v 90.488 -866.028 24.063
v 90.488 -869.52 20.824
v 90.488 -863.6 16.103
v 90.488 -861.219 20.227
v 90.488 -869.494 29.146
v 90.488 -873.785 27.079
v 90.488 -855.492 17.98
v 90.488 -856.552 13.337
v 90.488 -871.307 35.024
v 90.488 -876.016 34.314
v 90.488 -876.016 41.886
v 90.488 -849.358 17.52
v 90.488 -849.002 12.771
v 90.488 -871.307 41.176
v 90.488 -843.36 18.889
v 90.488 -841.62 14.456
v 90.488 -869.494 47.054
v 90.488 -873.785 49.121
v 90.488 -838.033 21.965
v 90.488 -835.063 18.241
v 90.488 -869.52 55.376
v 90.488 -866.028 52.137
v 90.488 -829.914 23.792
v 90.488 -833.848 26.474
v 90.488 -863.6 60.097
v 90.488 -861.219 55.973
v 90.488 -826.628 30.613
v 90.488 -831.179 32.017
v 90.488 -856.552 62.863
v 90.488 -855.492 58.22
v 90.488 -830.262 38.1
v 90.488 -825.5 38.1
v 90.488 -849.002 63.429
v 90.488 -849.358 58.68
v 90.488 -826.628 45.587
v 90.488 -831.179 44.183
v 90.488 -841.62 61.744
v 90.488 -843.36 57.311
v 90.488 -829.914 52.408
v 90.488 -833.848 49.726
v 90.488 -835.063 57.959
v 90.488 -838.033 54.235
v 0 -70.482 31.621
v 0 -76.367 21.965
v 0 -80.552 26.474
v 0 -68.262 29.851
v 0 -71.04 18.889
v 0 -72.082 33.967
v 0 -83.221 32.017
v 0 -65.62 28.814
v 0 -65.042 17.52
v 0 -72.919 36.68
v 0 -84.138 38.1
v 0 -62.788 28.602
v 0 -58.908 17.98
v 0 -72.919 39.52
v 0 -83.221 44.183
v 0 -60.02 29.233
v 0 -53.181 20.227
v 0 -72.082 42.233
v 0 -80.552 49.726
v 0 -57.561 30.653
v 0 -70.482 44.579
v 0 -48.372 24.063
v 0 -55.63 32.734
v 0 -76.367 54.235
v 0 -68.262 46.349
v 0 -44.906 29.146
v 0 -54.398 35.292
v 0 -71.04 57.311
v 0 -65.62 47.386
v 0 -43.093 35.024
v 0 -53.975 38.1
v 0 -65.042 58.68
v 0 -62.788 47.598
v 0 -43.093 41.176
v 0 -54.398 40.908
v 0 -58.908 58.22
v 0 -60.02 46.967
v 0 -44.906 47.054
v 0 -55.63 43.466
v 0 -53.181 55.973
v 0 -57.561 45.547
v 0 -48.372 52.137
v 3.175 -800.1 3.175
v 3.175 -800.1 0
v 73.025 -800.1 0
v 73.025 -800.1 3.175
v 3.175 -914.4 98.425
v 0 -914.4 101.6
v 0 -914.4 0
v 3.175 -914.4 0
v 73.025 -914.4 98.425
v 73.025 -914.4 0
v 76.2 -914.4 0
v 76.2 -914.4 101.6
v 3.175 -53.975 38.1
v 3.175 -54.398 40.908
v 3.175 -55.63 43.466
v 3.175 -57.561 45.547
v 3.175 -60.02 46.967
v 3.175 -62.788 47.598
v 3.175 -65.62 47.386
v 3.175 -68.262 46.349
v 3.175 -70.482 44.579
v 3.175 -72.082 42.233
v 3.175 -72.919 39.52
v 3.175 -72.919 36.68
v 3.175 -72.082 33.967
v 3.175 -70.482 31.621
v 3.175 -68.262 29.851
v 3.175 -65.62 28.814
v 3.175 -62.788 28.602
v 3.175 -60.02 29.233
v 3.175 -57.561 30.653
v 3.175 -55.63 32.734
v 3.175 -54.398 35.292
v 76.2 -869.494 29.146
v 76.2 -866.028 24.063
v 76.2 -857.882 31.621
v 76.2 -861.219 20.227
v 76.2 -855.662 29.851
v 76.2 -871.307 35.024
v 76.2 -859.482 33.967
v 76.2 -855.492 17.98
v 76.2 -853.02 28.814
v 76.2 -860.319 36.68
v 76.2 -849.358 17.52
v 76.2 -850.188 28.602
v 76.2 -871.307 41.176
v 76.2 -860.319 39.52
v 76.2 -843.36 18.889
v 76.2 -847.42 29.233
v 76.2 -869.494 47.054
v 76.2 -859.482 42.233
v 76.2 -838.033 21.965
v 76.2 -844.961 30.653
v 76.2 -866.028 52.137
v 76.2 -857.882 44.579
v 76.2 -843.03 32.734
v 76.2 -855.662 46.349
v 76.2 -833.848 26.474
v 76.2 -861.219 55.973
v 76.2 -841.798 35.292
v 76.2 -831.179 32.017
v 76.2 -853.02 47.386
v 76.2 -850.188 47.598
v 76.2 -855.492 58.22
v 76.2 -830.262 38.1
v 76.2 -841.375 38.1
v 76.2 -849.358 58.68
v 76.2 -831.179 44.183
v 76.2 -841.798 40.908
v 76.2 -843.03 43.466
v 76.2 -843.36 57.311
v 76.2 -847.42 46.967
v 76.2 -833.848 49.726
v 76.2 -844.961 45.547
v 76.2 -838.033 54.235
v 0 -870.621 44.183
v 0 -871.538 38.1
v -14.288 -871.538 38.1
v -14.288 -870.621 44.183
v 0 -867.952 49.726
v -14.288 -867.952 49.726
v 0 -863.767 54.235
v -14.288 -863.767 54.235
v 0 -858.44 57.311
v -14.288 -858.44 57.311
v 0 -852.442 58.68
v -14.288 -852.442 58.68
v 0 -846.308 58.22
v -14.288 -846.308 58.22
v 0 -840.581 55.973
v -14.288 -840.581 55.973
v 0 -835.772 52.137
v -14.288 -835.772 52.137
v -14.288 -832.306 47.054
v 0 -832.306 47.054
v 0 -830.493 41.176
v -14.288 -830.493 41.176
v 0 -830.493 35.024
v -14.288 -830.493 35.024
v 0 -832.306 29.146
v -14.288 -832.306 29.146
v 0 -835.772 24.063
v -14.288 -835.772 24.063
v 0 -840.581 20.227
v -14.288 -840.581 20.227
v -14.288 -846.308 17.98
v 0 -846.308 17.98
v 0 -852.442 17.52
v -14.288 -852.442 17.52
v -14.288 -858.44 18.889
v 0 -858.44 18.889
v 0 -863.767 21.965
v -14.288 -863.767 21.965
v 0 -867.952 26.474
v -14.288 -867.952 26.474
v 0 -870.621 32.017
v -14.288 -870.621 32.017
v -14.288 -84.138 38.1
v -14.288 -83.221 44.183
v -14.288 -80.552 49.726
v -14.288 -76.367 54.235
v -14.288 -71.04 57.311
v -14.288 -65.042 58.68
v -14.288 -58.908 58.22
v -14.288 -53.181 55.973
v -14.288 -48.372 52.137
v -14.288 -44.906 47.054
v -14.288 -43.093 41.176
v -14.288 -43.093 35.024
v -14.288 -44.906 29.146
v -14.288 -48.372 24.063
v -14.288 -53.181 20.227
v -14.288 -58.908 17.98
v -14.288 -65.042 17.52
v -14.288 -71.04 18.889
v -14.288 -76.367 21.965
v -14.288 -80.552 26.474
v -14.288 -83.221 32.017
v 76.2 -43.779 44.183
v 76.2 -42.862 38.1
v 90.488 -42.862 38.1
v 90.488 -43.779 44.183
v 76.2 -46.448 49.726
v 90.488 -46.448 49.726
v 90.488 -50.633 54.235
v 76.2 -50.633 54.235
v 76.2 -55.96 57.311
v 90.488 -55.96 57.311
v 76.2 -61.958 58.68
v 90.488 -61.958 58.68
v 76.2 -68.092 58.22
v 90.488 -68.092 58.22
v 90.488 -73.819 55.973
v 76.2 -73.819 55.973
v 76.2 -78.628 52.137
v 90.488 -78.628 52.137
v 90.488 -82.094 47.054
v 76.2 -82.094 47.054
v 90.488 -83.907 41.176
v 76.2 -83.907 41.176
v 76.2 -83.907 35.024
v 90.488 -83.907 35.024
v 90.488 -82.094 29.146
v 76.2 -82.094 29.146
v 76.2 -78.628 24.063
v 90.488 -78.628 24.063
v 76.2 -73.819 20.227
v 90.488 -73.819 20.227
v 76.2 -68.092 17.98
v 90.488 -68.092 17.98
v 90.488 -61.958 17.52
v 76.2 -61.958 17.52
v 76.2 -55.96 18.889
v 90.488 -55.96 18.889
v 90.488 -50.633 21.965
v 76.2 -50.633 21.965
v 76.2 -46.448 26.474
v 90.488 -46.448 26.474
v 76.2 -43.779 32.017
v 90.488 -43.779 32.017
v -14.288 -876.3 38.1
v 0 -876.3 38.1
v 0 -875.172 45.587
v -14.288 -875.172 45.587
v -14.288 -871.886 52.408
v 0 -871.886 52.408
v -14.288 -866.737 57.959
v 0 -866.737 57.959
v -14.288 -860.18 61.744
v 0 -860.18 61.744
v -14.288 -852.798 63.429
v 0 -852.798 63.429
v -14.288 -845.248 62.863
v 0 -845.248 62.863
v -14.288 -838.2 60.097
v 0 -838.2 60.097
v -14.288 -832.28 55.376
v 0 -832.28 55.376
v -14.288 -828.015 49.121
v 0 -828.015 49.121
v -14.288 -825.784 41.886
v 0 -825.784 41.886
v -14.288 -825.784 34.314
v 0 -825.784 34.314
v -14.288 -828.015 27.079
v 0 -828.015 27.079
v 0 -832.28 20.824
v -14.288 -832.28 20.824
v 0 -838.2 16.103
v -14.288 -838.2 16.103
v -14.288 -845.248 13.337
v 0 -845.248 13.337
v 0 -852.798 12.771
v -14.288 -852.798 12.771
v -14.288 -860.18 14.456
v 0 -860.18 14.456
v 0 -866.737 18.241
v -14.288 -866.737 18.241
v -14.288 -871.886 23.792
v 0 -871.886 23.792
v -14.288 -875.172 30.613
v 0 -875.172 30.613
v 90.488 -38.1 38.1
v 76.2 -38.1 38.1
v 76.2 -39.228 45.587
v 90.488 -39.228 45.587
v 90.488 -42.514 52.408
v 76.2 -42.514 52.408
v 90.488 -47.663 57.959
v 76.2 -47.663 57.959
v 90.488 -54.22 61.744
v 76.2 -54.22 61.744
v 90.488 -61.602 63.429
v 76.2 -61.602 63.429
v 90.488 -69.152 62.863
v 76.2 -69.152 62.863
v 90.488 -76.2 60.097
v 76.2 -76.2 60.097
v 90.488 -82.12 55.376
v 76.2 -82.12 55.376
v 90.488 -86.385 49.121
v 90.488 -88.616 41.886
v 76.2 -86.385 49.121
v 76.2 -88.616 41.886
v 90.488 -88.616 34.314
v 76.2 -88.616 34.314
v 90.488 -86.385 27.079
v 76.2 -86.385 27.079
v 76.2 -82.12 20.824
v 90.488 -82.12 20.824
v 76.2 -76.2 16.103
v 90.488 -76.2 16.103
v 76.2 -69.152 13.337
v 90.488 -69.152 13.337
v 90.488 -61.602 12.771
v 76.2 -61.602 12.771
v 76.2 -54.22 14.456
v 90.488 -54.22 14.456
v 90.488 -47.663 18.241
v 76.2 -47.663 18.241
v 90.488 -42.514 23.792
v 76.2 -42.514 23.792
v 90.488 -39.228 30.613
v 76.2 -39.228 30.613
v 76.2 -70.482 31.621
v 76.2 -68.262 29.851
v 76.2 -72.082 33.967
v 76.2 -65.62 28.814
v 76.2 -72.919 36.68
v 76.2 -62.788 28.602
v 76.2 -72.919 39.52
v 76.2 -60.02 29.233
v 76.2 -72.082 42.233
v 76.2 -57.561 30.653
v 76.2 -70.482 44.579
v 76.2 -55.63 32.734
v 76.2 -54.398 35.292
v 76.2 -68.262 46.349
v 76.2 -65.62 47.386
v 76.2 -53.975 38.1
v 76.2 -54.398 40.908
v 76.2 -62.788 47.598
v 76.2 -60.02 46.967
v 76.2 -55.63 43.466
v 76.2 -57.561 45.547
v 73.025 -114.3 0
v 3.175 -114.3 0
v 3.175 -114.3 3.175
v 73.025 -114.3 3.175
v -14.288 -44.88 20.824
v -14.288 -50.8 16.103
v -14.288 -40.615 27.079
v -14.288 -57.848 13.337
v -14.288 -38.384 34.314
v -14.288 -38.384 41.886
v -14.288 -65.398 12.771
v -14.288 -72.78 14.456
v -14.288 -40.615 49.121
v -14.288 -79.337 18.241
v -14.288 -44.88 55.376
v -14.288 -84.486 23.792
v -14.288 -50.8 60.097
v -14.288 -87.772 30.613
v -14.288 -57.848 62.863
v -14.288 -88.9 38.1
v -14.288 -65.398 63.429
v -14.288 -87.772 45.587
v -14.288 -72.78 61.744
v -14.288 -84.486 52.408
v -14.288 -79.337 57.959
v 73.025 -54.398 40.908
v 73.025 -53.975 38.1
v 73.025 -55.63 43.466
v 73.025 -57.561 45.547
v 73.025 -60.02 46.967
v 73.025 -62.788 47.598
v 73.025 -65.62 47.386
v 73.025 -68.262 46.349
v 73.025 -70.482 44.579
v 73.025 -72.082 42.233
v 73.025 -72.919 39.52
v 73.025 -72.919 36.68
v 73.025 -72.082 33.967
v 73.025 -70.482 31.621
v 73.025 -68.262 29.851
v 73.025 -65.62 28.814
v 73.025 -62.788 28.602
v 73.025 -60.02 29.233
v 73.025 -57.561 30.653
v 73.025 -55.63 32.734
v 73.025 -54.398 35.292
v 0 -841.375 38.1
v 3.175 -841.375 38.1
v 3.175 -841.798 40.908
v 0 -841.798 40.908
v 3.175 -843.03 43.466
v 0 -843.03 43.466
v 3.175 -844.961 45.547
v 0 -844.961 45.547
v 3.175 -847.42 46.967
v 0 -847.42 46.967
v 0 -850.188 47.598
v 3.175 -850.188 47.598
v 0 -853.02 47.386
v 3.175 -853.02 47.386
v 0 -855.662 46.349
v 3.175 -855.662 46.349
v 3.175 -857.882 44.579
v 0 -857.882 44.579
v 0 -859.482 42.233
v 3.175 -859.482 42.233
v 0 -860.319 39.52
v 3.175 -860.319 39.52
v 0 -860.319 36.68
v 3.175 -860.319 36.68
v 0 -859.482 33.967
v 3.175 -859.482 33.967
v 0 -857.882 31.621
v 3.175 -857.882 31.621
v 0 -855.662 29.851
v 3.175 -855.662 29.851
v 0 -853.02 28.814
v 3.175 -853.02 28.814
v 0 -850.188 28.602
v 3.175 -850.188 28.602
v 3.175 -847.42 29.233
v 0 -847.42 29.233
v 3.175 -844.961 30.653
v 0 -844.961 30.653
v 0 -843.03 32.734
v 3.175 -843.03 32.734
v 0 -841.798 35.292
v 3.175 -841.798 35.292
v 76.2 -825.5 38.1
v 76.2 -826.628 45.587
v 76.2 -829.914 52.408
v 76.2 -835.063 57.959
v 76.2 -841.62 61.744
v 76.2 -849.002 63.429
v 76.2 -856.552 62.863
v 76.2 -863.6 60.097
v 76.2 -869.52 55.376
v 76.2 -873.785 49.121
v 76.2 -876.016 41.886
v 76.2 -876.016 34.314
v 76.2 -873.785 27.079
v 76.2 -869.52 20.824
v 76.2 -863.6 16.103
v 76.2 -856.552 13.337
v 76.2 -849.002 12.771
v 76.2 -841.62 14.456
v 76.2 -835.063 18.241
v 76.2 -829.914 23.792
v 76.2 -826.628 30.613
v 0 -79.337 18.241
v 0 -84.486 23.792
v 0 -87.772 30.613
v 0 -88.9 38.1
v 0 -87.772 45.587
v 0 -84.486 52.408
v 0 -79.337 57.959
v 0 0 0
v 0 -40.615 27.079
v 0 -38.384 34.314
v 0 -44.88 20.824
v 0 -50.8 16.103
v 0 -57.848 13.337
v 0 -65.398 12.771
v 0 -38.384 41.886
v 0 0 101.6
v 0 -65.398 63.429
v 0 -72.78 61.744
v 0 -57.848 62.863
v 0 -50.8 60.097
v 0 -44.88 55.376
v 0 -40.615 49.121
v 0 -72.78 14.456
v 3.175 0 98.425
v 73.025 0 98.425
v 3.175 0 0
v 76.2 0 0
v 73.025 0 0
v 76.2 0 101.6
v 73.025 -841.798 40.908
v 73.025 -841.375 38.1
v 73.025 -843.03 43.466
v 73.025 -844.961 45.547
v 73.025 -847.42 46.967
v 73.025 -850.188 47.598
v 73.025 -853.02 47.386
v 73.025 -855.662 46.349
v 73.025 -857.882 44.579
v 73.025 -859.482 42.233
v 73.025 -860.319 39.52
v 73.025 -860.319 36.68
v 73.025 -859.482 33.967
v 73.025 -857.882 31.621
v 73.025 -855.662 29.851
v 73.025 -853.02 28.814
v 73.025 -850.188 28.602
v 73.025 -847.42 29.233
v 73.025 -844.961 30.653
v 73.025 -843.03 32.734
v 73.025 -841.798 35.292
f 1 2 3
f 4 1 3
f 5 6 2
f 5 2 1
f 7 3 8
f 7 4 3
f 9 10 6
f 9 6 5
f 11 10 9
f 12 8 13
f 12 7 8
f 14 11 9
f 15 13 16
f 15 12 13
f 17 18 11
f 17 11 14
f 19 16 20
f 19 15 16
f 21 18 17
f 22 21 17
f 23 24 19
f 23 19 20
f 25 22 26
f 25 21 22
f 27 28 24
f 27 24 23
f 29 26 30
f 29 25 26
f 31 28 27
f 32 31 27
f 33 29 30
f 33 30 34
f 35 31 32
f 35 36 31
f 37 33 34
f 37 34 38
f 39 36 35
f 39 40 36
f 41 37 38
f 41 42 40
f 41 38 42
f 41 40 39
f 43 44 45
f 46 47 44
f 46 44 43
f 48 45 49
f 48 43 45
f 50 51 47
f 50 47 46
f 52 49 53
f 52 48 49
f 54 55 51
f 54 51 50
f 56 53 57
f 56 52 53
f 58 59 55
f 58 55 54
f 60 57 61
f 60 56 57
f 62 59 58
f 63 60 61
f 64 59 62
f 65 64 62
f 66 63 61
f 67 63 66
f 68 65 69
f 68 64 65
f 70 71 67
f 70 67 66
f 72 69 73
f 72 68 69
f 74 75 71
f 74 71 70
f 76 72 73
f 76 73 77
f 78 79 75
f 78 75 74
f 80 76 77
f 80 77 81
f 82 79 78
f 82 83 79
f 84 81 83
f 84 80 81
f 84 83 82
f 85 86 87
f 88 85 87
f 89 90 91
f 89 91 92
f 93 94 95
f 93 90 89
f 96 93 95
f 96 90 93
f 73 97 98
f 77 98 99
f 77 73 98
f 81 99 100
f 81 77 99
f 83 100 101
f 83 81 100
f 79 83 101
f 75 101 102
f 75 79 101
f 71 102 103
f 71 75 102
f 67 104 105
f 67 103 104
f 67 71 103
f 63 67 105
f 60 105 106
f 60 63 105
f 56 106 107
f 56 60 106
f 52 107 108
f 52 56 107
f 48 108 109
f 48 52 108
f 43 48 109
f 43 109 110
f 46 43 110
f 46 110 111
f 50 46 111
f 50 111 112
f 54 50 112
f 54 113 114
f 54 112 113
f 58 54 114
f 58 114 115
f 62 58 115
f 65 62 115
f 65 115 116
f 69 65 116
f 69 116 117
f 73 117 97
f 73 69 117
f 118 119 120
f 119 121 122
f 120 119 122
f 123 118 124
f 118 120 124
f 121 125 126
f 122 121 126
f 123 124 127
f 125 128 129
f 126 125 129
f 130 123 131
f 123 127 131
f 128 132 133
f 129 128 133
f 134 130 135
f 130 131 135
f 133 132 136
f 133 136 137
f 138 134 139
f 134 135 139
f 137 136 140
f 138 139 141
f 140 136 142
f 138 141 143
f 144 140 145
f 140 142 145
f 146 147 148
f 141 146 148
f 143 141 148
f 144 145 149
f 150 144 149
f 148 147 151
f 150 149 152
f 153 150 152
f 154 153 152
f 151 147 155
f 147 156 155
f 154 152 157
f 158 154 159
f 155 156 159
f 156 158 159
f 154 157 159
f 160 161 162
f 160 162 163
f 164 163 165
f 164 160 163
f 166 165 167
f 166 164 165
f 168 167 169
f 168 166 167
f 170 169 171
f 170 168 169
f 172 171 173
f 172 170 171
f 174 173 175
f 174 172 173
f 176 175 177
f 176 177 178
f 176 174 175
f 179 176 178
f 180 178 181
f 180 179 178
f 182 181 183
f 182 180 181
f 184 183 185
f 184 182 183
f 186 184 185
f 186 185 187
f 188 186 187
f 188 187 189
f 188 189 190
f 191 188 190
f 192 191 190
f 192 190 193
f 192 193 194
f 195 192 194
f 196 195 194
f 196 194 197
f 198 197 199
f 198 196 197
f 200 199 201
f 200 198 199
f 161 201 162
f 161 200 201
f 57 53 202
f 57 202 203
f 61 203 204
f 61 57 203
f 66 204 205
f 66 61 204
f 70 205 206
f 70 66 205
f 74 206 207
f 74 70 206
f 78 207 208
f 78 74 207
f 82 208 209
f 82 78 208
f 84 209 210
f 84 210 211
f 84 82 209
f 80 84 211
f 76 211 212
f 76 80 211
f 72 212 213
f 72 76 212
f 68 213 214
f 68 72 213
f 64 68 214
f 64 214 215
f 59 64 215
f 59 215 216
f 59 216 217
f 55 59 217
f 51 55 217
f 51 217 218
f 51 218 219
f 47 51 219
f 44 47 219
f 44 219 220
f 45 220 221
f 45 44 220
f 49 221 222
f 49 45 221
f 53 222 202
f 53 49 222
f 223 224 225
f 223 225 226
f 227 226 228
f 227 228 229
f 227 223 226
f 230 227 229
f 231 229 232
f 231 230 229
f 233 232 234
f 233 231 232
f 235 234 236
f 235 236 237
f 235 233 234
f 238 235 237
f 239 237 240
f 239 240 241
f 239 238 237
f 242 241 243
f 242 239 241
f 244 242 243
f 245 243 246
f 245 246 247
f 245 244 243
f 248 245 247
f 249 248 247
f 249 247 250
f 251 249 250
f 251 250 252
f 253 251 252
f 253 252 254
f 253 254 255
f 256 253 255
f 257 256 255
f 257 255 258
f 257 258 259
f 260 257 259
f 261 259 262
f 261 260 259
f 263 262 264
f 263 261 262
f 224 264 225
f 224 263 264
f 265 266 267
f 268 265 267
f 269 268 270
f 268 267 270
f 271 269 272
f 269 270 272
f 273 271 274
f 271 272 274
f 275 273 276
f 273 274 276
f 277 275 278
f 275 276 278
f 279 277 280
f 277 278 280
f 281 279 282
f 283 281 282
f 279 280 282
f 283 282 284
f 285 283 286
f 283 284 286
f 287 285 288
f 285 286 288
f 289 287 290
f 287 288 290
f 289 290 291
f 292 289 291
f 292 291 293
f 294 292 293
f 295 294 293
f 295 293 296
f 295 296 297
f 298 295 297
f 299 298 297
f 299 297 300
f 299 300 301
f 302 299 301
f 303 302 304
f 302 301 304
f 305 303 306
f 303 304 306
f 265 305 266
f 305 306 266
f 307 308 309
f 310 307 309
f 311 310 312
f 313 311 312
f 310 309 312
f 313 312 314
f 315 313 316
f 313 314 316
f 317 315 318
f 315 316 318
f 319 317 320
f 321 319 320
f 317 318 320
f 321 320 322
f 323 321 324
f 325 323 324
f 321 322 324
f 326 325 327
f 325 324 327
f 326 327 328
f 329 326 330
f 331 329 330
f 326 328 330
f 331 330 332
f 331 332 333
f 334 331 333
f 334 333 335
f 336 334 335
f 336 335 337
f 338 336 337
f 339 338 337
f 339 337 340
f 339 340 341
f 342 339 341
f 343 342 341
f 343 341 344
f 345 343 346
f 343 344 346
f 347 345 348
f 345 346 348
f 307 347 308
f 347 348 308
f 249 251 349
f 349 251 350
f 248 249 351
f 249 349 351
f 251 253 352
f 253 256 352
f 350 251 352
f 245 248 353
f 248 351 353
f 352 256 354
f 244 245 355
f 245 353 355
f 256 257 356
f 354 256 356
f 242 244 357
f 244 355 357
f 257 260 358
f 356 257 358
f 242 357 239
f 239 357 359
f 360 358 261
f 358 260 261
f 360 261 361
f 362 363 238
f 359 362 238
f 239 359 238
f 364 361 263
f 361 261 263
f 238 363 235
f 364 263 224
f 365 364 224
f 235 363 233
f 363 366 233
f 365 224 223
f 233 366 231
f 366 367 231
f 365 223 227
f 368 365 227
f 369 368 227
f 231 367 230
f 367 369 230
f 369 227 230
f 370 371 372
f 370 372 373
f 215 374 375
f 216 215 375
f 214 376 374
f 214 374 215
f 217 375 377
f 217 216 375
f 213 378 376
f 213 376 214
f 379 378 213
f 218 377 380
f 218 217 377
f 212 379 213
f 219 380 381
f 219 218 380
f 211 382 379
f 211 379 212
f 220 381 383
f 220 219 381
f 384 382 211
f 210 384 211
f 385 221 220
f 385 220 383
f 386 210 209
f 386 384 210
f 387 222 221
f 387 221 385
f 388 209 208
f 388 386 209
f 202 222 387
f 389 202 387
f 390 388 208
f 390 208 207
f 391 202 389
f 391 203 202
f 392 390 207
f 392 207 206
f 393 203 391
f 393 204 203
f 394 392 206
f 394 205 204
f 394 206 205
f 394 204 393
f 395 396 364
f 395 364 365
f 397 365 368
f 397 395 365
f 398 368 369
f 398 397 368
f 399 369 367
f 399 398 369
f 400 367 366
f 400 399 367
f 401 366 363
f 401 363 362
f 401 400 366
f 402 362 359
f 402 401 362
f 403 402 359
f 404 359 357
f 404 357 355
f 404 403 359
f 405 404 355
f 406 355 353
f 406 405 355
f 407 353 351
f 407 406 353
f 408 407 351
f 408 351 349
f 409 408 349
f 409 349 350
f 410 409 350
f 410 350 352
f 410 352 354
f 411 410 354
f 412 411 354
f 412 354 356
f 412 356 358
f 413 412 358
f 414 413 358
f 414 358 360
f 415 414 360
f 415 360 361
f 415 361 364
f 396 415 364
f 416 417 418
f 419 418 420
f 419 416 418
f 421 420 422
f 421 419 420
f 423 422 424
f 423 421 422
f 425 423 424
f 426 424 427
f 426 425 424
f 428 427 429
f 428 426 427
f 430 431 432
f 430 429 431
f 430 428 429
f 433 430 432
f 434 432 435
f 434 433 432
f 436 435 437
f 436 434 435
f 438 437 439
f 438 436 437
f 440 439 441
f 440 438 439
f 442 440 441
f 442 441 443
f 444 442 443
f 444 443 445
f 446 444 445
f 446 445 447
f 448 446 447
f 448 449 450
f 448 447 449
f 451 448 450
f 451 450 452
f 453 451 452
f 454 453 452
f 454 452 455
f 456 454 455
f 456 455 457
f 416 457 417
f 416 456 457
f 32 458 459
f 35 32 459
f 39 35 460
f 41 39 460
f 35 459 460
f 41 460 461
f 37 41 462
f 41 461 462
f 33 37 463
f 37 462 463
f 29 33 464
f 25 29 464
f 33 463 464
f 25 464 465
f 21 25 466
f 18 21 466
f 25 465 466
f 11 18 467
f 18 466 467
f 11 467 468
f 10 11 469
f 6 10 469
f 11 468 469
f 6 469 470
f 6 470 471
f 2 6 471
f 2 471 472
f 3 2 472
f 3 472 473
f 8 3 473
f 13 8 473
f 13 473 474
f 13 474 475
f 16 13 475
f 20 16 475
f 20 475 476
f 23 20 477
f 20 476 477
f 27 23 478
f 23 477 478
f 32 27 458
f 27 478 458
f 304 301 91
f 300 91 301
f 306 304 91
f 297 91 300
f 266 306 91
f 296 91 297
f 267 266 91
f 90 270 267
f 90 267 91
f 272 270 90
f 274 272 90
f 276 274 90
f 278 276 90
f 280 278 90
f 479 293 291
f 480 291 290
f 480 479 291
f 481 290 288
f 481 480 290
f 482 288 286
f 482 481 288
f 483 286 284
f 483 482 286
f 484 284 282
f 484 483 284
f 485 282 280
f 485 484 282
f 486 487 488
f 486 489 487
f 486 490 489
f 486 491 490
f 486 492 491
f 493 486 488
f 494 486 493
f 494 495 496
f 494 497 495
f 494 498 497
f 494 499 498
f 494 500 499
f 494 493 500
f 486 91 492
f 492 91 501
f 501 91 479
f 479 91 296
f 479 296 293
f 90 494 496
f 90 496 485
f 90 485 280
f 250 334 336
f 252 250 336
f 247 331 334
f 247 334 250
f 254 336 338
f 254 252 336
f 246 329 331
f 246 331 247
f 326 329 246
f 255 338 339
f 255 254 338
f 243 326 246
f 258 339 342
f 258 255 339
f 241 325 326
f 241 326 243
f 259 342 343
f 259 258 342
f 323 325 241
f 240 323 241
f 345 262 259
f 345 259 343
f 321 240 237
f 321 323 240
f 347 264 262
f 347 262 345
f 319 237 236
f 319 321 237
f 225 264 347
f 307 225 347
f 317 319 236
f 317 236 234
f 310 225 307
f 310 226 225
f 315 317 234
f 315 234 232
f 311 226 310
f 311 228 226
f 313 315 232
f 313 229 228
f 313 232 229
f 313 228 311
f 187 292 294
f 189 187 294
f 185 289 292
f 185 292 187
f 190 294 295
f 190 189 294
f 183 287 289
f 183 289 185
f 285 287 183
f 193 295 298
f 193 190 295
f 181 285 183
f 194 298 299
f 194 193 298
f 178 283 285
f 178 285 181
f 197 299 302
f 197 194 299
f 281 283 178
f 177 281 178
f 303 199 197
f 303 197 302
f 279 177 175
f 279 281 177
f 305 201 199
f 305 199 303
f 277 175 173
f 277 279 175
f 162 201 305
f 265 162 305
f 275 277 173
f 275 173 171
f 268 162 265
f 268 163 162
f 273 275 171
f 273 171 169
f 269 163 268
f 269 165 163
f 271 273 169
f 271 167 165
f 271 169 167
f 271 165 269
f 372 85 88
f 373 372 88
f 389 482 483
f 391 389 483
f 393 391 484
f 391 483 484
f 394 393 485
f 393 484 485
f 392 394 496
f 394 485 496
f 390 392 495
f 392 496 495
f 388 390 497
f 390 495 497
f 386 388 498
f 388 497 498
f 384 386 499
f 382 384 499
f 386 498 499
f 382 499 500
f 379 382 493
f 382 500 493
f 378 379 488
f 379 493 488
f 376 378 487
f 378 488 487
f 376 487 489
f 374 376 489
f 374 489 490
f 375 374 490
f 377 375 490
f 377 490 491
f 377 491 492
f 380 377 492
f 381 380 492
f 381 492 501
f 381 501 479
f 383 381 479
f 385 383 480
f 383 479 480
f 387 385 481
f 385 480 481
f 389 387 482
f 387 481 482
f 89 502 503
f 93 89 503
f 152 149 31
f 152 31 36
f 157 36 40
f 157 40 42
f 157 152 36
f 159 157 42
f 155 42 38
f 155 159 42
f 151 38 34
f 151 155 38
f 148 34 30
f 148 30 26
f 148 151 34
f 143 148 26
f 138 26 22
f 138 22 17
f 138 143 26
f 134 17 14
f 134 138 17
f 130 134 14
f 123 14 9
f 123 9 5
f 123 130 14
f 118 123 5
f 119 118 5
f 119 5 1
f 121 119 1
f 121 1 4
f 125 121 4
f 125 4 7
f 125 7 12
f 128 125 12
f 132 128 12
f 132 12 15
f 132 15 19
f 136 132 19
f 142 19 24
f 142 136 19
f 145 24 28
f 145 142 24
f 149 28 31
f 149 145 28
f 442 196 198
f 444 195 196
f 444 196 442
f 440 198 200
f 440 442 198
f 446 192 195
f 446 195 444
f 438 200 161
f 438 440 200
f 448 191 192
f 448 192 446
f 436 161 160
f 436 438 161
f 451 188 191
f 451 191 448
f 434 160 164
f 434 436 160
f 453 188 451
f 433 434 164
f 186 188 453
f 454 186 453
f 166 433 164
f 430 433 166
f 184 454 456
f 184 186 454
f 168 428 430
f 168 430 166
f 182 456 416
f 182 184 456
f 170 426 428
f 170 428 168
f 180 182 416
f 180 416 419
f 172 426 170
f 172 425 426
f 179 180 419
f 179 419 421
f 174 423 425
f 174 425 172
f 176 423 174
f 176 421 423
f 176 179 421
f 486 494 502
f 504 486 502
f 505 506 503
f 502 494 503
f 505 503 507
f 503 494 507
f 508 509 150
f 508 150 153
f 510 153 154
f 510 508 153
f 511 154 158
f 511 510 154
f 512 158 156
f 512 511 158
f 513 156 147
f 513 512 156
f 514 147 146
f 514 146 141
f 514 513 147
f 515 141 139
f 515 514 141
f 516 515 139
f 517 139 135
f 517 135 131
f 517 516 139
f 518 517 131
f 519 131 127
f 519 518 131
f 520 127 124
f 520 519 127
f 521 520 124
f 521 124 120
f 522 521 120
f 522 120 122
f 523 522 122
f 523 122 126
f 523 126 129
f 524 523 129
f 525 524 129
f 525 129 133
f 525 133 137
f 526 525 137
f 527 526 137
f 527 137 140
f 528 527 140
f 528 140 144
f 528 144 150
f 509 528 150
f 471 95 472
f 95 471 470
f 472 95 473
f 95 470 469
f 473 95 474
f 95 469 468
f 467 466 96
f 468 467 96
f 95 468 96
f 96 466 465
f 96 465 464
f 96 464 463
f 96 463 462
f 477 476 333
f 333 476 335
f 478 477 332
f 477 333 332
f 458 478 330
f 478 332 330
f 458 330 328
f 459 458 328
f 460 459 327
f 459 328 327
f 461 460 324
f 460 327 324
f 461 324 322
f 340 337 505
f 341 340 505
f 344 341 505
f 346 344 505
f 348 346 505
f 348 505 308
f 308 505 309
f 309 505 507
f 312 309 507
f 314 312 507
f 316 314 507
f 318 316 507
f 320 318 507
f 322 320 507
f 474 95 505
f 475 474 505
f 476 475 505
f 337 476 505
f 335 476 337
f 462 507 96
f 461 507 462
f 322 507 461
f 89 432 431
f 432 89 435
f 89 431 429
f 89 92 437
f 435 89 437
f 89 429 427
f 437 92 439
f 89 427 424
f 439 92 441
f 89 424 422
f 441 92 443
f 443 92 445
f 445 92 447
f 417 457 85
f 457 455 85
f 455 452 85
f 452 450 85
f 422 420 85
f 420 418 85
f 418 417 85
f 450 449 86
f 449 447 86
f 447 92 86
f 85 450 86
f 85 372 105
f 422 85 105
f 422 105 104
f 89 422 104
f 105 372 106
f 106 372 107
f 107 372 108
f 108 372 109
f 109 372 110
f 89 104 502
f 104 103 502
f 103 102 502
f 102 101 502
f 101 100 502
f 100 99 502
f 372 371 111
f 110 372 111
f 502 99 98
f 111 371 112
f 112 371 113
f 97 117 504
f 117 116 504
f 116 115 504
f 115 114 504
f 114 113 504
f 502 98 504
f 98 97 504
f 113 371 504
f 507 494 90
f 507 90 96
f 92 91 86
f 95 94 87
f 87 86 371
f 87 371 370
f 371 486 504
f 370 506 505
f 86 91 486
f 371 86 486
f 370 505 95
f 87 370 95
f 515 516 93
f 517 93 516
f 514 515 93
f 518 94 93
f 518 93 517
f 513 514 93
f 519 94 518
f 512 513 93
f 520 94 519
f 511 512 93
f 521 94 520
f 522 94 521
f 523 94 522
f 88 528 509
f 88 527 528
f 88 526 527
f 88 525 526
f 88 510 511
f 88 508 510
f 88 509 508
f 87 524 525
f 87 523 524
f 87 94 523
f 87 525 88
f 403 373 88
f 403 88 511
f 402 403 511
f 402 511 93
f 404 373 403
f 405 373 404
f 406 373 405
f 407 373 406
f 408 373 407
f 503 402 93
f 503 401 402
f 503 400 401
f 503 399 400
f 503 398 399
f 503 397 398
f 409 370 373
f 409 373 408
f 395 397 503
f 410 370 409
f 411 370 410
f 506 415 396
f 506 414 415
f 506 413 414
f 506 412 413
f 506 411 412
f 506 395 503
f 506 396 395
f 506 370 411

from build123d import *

# Parameters (mm, degrees)
F0_W     = 76.2
F0_H     = 101.6
F0_W_2   = 69.85
F0_H_2   = 95.25
F1_DEPTH = 914.4
F2_R     = 9.525
F3_DEPTH = 76.2
F4_W     = 69.85
F4_H     = 114.3
F5_DEPTH = 3.175
F6_R     = 25.4
F6_R_2   = 20.6375
F7_DEPTH = 14.2875
F8_R     = 25.4
F8_R_2   = 20.6375
F9_DEPTH = 14.2875


with BuildPart() as f1:
    # F0 (on Front) → F1 (new body)
    with BuildSketch(Plane.XZ):
        with Locations((38.1, 50.8)):
            Rectangle(F0_W, F0_H)
        with Locations((38.1, 50.8)):
            Rectangle(F0_W_2, F0_H_2, mode=Mode.SUBTRACT)
    extrude(amount=F1_DEPTH)

    # F2 (on Right) → F3 (cut)
    with BuildSketch(Plane.YZ):
        with Locations((-850.9, 38.1)):
            Circle(F2_R)
        with Locations((-63.5, 38.1)):
            Circle(F2_R)
    extrude(amount=F3_DEPTH, mode=Mode.SUBTRACT)

    # F4 (on Top) → F5 (cut)
    with BuildSketch(Plane.XY):
        with Locations((38.1, -857.25)):
            Rectangle(F4_W, F4_H)
        with Locations((38.1, -57.15)):
            Rectangle(F4_W, F4_H)
    extrude(amount=F5_DEPTH, mode=Mode.SUBTRACT)

    # F6 (on face) → F7 (join)
    with BuildSketch(Plane.YZ.offset(76.2)):
        with Locations((-850.9, 38.1)):
            Circle(F6_R)
        with Locations((-850.9, 38.1)):
            Circle(F6_R_2, mode=Mode.SUBTRACT)
        with Locations((-63.5, 38.1)):
            Circle(F6_R)
        with Locations((-63.5, 38.1)):
            Circle(F6_R_2, mode=Mode.SUBTRACT)
    extrude(amount=F7_DEPTH)

    # F8 (on face) → F9 (join)
    with BuildSketch(Plane(origin=(0, 0, 0), x_dir=(0, -1, 0), z_dir=(-1, 0, 0))):
        with Locations((63.5, 38.1)):
            Circle(F8_R)
        with Locations((63.5, 38.1)):
            Circle(F8_R_2, mode=Mode.SUBTRACT)
        with Locations((850.9, 38.1)):
            Circle(F8_R)
        with Locations((850.9, 38.1)):
            Circle(F8_R_2, mode=Mode.SUBTRACT)
    extrude(amount=F9_DEPTH)


solid = f1.part
